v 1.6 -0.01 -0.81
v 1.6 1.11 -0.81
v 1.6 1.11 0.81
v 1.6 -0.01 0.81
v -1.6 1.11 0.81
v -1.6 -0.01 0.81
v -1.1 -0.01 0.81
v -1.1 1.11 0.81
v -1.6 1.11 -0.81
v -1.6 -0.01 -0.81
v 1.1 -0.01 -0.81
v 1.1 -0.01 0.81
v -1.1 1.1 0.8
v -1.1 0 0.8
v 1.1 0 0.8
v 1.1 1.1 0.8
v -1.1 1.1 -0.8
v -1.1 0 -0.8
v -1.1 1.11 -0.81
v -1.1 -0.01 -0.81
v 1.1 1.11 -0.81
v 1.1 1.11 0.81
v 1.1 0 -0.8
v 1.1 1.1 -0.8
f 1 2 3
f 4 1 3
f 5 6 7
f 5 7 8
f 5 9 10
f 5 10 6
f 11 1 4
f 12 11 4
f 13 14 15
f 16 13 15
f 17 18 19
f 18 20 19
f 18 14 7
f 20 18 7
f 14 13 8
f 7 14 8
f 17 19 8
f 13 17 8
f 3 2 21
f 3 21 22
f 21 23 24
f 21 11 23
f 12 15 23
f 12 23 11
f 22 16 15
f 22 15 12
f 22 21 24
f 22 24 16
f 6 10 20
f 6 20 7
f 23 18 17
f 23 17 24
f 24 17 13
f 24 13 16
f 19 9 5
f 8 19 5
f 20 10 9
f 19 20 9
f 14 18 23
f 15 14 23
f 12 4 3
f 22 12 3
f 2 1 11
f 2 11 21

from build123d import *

# Parameters (mm, degrees)
SKETCH_1_W      = 3.2
SKETCH_1_H      = 1.6
EXTRUDE_1_DEPTH = 1.1
SKETCH_2_W      = 1.62
SKETCH_2_H      = 1.12
EXTRUDE_2_DEPTH = 0.5


with BuildPart() as part:
    # 草图1 → 凸台-拉伸1 (new body)
    with BuildSketch(Plane(origin=(0, 0, 0), x_dir=(1, 0, 0), z_dir=(0, 1, 0))):
        Rectangle(SKETCH_1_W, SKETCH_1_H)
    extrude(amount=EXTRUDE_1_DEPTH)

    # 草图2 → 凸台-拉伸2 (add)
    with BuildSketch(Plane.ZY.offset(1.6)):
        with Locations((0, 0.55)):
            Rectangle(SKETCH_2_W, SKETCH_2_H)
    extrude_2 = extrude(amount=-EXTRUDE_2_DEPTH)

    # 镜向1: 凸台-拉伸2 across plane
    add(extrude_2.mirror(Plane(origin=(0, 0, 0), x_dir=(0, 0, 1), z_dir=(1, 0, 0))))


solid = part.part
